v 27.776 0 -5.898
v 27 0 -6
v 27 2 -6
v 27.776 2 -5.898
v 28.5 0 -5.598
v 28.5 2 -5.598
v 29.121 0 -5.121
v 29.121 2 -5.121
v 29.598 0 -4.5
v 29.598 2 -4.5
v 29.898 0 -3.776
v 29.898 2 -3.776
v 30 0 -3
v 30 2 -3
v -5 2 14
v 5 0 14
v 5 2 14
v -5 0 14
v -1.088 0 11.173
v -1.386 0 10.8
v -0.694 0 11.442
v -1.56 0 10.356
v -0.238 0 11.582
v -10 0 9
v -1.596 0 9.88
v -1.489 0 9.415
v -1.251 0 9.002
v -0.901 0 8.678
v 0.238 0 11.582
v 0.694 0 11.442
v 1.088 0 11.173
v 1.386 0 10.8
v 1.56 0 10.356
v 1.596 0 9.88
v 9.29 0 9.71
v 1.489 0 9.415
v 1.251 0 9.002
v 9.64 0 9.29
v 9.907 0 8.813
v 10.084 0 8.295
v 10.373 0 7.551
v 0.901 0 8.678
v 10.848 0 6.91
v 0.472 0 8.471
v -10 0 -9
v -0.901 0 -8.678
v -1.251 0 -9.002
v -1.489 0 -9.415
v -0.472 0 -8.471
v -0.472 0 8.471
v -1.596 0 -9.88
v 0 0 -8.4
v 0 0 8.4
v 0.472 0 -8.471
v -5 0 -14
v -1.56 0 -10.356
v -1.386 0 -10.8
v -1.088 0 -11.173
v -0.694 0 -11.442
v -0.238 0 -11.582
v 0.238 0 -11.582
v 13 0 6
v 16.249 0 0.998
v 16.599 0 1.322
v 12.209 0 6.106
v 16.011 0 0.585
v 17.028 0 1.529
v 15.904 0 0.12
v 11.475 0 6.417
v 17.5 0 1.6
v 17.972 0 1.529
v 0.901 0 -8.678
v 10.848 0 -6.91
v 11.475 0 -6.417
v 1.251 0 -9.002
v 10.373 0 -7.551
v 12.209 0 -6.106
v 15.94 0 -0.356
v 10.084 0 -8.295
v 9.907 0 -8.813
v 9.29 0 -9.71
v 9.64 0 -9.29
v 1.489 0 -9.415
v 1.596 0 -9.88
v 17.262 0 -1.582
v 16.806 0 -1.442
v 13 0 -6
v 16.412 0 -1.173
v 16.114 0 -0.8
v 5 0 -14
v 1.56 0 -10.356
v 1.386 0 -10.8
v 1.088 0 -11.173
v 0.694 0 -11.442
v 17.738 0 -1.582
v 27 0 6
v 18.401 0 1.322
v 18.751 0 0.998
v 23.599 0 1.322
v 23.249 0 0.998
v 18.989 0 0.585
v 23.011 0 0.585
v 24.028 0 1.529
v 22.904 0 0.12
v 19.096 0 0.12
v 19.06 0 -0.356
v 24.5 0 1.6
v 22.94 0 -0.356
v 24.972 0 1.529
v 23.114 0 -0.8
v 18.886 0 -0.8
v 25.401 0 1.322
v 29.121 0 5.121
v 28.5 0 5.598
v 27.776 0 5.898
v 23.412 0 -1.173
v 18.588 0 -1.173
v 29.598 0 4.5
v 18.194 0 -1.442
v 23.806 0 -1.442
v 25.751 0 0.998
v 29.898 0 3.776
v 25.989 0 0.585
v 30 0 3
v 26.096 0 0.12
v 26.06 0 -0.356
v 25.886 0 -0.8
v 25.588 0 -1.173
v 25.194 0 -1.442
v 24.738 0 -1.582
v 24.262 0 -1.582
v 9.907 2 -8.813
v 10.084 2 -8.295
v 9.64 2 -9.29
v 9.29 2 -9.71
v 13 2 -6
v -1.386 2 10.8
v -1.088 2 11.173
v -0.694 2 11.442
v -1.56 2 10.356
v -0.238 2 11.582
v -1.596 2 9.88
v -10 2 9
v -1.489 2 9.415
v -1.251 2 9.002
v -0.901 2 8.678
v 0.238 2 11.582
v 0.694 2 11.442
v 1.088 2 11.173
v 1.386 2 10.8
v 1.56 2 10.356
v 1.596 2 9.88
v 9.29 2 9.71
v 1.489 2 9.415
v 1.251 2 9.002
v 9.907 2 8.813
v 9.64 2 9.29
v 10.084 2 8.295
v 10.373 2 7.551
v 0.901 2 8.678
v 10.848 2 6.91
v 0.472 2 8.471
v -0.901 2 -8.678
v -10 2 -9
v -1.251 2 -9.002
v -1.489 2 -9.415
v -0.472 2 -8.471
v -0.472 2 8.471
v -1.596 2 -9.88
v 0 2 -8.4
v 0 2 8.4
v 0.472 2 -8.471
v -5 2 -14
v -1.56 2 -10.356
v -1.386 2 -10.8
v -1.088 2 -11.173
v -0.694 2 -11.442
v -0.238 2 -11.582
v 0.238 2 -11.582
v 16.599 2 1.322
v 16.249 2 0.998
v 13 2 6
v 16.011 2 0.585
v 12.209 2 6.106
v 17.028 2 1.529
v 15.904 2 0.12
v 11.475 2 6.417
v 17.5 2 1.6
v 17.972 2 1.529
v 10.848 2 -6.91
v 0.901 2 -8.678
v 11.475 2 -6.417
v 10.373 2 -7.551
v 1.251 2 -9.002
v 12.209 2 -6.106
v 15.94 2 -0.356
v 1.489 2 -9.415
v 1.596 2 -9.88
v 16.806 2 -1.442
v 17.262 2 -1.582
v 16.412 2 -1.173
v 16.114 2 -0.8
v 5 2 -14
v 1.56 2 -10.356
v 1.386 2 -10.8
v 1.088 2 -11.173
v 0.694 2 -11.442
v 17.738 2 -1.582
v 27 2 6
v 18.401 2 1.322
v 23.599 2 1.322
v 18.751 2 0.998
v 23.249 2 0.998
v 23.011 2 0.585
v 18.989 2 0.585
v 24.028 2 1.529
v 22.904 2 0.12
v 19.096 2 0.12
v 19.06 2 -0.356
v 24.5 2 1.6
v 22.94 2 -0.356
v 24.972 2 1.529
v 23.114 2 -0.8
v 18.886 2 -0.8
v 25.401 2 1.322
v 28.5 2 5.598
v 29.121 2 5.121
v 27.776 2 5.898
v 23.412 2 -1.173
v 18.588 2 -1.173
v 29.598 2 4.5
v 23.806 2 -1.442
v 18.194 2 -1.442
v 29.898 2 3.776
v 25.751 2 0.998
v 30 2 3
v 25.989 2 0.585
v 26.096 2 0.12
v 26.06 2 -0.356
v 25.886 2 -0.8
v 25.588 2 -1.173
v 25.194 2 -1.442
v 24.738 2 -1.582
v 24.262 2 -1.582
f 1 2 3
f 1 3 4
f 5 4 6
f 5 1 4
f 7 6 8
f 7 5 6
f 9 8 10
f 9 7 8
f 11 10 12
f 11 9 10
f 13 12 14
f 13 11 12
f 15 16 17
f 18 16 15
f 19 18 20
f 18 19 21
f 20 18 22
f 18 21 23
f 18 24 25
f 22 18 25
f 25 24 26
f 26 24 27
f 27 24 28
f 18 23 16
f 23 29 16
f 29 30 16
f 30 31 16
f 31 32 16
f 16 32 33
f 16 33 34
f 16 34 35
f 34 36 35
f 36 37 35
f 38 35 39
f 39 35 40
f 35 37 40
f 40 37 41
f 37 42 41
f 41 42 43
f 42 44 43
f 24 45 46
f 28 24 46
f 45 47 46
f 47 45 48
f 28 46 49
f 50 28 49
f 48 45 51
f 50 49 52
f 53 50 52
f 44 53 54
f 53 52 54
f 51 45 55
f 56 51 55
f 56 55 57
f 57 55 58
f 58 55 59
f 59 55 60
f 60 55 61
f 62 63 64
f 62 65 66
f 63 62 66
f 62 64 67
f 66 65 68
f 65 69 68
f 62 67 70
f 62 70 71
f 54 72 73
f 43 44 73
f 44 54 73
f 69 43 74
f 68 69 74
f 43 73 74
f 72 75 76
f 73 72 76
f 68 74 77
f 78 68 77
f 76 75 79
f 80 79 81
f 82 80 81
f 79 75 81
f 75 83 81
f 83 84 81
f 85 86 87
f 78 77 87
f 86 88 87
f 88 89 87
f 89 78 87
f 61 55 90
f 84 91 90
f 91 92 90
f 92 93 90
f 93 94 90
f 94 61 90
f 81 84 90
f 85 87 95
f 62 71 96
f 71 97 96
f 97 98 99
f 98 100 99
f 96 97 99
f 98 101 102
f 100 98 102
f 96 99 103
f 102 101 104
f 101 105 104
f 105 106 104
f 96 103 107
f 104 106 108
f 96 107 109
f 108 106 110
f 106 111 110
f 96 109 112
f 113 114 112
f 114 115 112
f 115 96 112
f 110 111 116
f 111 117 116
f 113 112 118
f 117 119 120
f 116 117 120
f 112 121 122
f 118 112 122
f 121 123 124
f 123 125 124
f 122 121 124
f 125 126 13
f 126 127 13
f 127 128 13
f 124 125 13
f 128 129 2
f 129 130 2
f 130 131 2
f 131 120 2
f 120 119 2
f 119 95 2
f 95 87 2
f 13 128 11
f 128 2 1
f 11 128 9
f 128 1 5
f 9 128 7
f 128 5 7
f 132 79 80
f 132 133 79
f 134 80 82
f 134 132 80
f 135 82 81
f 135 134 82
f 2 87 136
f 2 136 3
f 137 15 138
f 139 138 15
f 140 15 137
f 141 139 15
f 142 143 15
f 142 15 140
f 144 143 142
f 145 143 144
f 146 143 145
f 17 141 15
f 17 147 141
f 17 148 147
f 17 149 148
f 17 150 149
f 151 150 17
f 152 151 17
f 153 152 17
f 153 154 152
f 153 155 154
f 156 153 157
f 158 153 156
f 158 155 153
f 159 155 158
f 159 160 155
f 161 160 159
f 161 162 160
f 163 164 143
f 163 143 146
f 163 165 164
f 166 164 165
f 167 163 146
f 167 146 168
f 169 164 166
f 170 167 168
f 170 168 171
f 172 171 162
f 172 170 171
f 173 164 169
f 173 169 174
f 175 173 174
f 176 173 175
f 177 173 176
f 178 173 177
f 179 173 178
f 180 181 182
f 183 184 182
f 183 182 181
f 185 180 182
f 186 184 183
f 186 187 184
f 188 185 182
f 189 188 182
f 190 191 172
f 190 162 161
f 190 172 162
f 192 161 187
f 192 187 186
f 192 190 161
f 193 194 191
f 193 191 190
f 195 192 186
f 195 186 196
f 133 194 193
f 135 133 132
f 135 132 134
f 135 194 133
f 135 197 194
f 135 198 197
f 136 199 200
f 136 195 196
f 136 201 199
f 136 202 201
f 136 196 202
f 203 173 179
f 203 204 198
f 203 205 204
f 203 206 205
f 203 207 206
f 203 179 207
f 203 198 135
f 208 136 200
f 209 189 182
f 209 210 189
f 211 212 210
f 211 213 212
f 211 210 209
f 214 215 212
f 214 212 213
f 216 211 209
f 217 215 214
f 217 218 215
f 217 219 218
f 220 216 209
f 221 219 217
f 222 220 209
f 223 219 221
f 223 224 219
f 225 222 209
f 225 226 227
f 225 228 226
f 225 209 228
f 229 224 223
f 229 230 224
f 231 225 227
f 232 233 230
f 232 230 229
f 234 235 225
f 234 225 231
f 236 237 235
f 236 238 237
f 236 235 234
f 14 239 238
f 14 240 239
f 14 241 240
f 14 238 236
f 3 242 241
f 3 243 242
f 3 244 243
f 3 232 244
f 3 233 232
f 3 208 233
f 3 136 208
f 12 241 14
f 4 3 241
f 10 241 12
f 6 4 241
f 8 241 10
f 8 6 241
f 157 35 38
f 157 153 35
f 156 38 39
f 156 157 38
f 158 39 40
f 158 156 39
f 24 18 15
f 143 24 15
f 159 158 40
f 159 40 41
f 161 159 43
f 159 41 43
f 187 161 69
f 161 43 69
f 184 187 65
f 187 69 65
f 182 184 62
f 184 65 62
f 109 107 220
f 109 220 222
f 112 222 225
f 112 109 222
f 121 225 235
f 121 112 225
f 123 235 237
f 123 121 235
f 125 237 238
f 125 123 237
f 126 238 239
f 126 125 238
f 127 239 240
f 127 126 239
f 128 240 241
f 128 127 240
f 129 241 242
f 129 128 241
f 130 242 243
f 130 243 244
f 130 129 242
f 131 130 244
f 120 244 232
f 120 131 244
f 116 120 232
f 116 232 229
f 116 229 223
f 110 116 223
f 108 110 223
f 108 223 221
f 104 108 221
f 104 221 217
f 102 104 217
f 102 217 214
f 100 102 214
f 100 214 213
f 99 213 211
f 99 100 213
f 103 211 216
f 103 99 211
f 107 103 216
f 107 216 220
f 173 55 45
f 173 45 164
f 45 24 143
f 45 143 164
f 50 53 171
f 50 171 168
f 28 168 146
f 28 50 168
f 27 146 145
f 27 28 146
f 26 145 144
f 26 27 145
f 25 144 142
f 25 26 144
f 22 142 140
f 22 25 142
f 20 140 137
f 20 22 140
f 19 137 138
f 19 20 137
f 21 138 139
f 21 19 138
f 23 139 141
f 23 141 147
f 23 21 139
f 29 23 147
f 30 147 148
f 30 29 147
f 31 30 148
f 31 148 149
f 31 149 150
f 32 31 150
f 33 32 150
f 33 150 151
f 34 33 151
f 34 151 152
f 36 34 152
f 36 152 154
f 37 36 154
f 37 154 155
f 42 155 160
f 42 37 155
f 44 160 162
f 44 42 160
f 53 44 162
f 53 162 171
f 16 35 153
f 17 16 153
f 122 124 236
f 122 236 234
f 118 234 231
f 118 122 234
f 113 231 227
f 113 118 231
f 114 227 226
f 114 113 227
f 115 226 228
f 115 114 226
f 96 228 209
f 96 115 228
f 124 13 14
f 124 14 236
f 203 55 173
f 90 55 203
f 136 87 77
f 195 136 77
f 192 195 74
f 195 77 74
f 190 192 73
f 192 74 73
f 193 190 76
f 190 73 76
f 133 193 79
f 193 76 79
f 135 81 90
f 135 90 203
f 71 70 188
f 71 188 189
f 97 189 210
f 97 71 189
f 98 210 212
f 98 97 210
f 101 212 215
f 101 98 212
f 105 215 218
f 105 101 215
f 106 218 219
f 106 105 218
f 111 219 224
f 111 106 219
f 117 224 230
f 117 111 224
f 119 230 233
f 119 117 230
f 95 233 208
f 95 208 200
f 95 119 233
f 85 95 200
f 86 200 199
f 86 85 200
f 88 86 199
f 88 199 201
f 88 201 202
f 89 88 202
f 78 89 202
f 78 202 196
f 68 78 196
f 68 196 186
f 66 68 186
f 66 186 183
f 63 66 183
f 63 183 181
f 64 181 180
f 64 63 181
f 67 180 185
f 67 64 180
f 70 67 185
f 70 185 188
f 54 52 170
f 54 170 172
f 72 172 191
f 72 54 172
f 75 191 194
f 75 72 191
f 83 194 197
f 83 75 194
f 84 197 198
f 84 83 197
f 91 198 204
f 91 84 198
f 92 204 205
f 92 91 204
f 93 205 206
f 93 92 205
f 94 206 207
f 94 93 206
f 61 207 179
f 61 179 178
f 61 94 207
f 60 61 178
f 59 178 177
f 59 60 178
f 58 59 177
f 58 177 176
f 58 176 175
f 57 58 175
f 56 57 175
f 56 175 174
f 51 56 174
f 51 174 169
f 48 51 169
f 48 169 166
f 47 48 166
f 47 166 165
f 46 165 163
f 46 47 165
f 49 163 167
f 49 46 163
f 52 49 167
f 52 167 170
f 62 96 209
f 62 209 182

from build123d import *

# Parameters (mm, degrees)
SKETCH_1_R       = 1.6
EXTRUDE_1_DEPTH  = 2
CHAMFER_1_SIZE   = 5
FILLET_START     = -1
FILLET_1_DEPTH   = 4
FILLET_1_2_DEPTH = 2
FILLET_2_R       = 3


with BuildPart() as part:
    # 草图1 → 凸台-拉伸1 (new body)
    with BuildSketch(Plane(origin=(0, 0, 0), x_dir=(1, 0, 0), z_dir=(0, 1, 0))):
        Polygon((-10, -14), (-10, 14), (10, 14), (10, 6), (30, 6), (30, -6), (10, -6), (10, -14), align=None)
        with Locations(Location((0, 10, 0), (0, 0, 270))):
            Circle(SKETCH_1_R, mode=Mode.SUBTRACT)
        with Locations(Location((0, -10, 0), (0, 0, 90))):
            Circle(SKETCH_1_R, mode=Mode.SUBTRACT)
        with Locations(Location((17.5, 0, 0), (0, 0, 270))):
            Circle(SKETCH_1_R, mode=Mode.SUBTRACT)
        with Locations(Location((24.5, 0, 0), (0, 0, 270))):
            Circle(SKETCH_1_R, mode=Mode.SUBTRACT)
    extrude(amount=EXTRUDE_1_DEPTH)

    # 倒角1
    chamfer_1_edges = [part.edges().sort_by_distance(p)[0] for p in [
        (10, 1, 14),
        (-10, 1, 14),
        (-10, 1, -14),
        (10, 1, -14),
    ]]
    chamfer(chamfer_1_edges, length=CHAMFER_1_SIZE)

    # 圆角1: read off the stored shape, not the designer's step
    # 圆角1 outline → 圆角1 (cut)
    with BuildSketch(Plane(origin=(0, 0, 0), x_dir=(1, 0, 0), z_dir=(0, 1, 0)).offset(FILLET_START)):
        with BuildLine():
            ThreePointArc((27, 6), (29.121320344, 5.121320344), (30, 3))
            Line((30, 3), (30, 6))
            Line((30, 6), (27, 6))
        make_face()
        with BuildLine():
            ThreePointArc((30, -3), (29.121320344, -5.121320344), (27, -6))
            Line((27, -6), (30, -6))
            Line((30, -6), (30, -3))
        make_face()
    extrude(amount=FILLET_1_DEPTH, mode=Mode.SUBTRACT)

    # Fillet 1 2 outline → Fillet 1 2 (add)
    with BuildSketch(Plane(origin=(0, 0, 0), x_dir=(1, 0, 0), z_dir=(0, 1, 0))):
        with BuildLine():
            Line((10, 6), (13, 6))
            ThreePointArc((13, 6), (10.878679656, 6.878679656), (10, 9))
            Line((10, 9), (10, 6))
        make_face()
        with BuildLine():
            ThreePointArc((10, -9), (10.878679656, -6.878679656), (13, -6))
            Line((13, -6), (10, -6))
            Line((10, -6), (10, -9))
        make_face()
    extrude(amount=FILLET_1_2_DEPTH)

    # 圆角2
    fillet_2_edges = [part.edges().sort_by_distance(p)[0] for p in [
        (10, 1, 9),
        (10, 1, -9),
    ]]
    fillet(fillet_2_edges, radius=FILLET_2_R)


solid = part.part
